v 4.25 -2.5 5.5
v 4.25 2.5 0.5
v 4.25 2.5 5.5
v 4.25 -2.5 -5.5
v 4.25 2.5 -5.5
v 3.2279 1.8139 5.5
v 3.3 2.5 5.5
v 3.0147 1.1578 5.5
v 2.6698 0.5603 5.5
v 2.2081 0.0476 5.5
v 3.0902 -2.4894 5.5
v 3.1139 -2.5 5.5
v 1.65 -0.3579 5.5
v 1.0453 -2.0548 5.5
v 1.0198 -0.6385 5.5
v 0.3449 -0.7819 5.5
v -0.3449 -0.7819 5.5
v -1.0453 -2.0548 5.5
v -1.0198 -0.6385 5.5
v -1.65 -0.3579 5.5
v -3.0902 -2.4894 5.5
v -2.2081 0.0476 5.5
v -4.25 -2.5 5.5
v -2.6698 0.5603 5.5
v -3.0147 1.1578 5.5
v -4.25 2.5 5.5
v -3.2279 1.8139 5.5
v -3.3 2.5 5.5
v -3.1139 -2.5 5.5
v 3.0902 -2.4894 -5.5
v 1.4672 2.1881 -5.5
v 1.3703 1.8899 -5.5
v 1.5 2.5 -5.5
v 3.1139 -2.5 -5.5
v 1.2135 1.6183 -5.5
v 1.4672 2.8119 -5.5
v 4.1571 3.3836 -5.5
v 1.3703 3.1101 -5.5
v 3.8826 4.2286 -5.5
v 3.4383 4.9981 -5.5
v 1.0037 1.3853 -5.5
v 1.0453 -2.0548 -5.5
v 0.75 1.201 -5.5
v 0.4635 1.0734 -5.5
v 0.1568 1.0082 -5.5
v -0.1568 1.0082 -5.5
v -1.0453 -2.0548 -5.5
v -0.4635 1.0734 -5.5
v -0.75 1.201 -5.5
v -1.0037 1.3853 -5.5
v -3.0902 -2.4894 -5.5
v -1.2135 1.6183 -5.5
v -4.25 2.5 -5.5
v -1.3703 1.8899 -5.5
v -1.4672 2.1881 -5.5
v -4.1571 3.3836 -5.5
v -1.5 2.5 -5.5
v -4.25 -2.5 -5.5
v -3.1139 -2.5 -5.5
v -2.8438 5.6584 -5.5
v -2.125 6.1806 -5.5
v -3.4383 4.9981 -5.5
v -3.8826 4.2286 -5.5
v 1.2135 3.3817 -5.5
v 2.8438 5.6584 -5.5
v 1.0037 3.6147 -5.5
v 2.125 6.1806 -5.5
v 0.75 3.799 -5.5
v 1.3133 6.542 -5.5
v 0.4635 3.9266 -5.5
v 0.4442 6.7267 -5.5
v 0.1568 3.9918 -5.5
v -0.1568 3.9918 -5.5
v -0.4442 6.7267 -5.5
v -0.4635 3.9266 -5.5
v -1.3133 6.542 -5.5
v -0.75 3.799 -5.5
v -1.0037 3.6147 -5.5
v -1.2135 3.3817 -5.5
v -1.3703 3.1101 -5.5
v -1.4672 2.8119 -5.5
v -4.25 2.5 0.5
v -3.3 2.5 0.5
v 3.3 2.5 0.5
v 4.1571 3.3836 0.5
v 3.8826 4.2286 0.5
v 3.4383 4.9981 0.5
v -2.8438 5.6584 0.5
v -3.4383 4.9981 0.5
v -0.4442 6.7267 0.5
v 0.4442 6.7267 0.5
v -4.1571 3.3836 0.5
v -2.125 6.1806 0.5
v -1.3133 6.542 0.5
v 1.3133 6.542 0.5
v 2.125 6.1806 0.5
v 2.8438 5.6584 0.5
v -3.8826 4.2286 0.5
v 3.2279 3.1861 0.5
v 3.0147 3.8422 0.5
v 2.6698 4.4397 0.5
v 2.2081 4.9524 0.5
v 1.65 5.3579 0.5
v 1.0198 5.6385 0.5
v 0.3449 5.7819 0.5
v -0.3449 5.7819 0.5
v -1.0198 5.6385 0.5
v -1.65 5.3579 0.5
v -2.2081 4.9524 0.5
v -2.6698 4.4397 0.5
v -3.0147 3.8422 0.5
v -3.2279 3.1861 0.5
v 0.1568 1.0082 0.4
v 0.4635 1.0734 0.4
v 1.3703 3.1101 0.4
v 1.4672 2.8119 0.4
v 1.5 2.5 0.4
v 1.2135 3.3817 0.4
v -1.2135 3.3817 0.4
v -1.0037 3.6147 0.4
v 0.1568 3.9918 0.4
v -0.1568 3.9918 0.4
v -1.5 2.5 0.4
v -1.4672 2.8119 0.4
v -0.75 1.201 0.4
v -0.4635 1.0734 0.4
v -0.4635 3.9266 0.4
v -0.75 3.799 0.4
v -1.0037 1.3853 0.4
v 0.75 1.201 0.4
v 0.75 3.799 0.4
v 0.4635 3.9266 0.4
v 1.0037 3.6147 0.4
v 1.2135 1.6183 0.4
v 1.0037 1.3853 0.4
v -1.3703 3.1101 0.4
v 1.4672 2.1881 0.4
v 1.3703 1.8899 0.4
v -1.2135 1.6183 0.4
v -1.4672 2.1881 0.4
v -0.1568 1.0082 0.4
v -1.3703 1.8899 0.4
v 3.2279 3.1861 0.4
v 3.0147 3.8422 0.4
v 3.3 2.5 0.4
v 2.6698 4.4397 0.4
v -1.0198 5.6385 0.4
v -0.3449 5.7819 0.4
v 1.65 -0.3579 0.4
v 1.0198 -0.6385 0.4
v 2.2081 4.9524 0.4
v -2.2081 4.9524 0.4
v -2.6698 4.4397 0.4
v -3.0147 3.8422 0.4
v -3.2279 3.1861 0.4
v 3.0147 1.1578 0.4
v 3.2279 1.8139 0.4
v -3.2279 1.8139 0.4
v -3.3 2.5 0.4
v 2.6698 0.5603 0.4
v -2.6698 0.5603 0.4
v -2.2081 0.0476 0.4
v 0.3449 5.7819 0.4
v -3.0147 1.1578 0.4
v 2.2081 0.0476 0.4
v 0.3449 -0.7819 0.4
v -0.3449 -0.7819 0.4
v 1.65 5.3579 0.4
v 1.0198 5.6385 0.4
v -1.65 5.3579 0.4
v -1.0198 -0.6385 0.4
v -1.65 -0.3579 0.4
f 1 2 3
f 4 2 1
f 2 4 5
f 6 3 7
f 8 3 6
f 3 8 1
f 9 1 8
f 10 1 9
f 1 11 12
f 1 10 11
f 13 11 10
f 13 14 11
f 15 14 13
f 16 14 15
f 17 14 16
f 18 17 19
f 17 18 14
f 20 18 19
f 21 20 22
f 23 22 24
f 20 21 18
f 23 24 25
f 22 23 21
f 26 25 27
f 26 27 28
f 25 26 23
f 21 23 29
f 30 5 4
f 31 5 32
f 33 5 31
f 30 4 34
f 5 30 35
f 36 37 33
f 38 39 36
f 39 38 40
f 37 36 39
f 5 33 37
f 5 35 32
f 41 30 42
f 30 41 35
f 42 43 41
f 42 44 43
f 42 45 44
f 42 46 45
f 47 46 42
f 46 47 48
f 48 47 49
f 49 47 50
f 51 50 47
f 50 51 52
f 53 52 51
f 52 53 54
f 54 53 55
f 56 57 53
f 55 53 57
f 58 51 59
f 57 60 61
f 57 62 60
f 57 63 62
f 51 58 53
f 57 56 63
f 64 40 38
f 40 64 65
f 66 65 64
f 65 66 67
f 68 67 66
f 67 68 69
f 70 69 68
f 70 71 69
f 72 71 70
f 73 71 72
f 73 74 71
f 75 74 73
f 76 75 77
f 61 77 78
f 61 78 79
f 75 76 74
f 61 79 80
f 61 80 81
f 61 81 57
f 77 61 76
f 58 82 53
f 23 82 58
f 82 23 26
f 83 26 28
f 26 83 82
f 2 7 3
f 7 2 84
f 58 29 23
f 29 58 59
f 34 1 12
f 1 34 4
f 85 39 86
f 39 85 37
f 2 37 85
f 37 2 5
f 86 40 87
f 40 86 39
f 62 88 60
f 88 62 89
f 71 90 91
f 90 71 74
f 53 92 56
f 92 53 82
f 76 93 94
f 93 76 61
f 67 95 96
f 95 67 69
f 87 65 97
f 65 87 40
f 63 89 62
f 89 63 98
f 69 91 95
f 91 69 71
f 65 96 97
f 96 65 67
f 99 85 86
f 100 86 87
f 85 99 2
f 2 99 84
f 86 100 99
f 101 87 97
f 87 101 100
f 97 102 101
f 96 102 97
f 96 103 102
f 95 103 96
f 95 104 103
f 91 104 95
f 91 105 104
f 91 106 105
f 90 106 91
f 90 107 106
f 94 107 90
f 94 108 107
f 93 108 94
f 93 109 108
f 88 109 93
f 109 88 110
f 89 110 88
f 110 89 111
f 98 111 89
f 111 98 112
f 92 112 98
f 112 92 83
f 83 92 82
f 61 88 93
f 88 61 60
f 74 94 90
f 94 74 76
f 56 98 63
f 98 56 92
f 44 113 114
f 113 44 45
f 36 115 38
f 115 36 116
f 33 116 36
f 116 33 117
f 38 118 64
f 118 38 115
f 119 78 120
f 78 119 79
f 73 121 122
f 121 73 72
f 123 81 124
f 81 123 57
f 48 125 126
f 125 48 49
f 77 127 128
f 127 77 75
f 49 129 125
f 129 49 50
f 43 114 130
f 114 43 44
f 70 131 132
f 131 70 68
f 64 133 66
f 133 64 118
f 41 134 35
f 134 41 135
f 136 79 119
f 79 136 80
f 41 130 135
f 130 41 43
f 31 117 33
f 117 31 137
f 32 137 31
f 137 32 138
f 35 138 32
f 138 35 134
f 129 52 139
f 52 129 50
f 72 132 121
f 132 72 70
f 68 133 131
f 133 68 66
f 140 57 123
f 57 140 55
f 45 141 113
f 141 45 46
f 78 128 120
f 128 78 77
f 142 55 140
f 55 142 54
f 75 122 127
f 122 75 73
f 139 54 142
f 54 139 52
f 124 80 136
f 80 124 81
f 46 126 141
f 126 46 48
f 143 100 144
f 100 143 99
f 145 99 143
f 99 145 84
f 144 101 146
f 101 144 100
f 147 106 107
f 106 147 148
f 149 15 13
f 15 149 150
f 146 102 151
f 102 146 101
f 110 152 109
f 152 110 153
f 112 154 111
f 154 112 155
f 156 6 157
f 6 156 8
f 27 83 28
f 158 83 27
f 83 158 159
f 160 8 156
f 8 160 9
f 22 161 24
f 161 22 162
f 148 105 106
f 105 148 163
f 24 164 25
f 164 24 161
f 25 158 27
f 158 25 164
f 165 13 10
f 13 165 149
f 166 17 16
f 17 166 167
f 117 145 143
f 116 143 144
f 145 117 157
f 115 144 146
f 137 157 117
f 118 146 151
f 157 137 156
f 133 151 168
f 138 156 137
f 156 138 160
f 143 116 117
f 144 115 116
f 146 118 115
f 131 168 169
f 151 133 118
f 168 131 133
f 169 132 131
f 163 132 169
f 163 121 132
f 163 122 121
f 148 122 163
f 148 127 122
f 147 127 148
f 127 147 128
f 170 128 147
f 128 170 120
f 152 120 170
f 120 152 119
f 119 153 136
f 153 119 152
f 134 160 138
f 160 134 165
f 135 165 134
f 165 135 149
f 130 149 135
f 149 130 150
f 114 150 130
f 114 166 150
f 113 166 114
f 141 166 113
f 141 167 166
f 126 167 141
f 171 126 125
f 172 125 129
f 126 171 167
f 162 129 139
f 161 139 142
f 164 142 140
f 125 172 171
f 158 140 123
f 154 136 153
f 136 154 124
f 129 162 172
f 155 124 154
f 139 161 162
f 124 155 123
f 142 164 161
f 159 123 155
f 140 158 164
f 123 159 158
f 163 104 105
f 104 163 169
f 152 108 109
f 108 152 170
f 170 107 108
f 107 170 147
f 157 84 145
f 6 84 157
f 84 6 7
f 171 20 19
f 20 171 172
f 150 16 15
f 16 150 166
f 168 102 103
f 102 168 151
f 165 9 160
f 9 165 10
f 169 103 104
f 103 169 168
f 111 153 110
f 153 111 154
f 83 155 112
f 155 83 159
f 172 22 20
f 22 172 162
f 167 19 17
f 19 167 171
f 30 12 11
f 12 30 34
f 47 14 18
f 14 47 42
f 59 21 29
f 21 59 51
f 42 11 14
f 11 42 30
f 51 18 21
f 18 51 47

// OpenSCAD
$fs= 0.05; //detail kulatin v milimetrech
sroub = 3; //[0.0:5.0]
difference() {
	union() {
		cube([8.5,5,11],center=true); //Hlavni kvadr
		translate([0,2.5,-5.5]) cylinder(6,4.25,4.25); //Podlozka pod sroubem
	}
translate([0,2.5,-10]){cylinder(20,1.5,1.5);} //Dira na zavit sroubu
translate([0,2.5,0.4]){cylinder(11,3.3,3.3);} //Dira na hlavicku sroubu
translate([0,-12,-10]){cylinder(20,10,10);}  //Vykus na roletku
}
